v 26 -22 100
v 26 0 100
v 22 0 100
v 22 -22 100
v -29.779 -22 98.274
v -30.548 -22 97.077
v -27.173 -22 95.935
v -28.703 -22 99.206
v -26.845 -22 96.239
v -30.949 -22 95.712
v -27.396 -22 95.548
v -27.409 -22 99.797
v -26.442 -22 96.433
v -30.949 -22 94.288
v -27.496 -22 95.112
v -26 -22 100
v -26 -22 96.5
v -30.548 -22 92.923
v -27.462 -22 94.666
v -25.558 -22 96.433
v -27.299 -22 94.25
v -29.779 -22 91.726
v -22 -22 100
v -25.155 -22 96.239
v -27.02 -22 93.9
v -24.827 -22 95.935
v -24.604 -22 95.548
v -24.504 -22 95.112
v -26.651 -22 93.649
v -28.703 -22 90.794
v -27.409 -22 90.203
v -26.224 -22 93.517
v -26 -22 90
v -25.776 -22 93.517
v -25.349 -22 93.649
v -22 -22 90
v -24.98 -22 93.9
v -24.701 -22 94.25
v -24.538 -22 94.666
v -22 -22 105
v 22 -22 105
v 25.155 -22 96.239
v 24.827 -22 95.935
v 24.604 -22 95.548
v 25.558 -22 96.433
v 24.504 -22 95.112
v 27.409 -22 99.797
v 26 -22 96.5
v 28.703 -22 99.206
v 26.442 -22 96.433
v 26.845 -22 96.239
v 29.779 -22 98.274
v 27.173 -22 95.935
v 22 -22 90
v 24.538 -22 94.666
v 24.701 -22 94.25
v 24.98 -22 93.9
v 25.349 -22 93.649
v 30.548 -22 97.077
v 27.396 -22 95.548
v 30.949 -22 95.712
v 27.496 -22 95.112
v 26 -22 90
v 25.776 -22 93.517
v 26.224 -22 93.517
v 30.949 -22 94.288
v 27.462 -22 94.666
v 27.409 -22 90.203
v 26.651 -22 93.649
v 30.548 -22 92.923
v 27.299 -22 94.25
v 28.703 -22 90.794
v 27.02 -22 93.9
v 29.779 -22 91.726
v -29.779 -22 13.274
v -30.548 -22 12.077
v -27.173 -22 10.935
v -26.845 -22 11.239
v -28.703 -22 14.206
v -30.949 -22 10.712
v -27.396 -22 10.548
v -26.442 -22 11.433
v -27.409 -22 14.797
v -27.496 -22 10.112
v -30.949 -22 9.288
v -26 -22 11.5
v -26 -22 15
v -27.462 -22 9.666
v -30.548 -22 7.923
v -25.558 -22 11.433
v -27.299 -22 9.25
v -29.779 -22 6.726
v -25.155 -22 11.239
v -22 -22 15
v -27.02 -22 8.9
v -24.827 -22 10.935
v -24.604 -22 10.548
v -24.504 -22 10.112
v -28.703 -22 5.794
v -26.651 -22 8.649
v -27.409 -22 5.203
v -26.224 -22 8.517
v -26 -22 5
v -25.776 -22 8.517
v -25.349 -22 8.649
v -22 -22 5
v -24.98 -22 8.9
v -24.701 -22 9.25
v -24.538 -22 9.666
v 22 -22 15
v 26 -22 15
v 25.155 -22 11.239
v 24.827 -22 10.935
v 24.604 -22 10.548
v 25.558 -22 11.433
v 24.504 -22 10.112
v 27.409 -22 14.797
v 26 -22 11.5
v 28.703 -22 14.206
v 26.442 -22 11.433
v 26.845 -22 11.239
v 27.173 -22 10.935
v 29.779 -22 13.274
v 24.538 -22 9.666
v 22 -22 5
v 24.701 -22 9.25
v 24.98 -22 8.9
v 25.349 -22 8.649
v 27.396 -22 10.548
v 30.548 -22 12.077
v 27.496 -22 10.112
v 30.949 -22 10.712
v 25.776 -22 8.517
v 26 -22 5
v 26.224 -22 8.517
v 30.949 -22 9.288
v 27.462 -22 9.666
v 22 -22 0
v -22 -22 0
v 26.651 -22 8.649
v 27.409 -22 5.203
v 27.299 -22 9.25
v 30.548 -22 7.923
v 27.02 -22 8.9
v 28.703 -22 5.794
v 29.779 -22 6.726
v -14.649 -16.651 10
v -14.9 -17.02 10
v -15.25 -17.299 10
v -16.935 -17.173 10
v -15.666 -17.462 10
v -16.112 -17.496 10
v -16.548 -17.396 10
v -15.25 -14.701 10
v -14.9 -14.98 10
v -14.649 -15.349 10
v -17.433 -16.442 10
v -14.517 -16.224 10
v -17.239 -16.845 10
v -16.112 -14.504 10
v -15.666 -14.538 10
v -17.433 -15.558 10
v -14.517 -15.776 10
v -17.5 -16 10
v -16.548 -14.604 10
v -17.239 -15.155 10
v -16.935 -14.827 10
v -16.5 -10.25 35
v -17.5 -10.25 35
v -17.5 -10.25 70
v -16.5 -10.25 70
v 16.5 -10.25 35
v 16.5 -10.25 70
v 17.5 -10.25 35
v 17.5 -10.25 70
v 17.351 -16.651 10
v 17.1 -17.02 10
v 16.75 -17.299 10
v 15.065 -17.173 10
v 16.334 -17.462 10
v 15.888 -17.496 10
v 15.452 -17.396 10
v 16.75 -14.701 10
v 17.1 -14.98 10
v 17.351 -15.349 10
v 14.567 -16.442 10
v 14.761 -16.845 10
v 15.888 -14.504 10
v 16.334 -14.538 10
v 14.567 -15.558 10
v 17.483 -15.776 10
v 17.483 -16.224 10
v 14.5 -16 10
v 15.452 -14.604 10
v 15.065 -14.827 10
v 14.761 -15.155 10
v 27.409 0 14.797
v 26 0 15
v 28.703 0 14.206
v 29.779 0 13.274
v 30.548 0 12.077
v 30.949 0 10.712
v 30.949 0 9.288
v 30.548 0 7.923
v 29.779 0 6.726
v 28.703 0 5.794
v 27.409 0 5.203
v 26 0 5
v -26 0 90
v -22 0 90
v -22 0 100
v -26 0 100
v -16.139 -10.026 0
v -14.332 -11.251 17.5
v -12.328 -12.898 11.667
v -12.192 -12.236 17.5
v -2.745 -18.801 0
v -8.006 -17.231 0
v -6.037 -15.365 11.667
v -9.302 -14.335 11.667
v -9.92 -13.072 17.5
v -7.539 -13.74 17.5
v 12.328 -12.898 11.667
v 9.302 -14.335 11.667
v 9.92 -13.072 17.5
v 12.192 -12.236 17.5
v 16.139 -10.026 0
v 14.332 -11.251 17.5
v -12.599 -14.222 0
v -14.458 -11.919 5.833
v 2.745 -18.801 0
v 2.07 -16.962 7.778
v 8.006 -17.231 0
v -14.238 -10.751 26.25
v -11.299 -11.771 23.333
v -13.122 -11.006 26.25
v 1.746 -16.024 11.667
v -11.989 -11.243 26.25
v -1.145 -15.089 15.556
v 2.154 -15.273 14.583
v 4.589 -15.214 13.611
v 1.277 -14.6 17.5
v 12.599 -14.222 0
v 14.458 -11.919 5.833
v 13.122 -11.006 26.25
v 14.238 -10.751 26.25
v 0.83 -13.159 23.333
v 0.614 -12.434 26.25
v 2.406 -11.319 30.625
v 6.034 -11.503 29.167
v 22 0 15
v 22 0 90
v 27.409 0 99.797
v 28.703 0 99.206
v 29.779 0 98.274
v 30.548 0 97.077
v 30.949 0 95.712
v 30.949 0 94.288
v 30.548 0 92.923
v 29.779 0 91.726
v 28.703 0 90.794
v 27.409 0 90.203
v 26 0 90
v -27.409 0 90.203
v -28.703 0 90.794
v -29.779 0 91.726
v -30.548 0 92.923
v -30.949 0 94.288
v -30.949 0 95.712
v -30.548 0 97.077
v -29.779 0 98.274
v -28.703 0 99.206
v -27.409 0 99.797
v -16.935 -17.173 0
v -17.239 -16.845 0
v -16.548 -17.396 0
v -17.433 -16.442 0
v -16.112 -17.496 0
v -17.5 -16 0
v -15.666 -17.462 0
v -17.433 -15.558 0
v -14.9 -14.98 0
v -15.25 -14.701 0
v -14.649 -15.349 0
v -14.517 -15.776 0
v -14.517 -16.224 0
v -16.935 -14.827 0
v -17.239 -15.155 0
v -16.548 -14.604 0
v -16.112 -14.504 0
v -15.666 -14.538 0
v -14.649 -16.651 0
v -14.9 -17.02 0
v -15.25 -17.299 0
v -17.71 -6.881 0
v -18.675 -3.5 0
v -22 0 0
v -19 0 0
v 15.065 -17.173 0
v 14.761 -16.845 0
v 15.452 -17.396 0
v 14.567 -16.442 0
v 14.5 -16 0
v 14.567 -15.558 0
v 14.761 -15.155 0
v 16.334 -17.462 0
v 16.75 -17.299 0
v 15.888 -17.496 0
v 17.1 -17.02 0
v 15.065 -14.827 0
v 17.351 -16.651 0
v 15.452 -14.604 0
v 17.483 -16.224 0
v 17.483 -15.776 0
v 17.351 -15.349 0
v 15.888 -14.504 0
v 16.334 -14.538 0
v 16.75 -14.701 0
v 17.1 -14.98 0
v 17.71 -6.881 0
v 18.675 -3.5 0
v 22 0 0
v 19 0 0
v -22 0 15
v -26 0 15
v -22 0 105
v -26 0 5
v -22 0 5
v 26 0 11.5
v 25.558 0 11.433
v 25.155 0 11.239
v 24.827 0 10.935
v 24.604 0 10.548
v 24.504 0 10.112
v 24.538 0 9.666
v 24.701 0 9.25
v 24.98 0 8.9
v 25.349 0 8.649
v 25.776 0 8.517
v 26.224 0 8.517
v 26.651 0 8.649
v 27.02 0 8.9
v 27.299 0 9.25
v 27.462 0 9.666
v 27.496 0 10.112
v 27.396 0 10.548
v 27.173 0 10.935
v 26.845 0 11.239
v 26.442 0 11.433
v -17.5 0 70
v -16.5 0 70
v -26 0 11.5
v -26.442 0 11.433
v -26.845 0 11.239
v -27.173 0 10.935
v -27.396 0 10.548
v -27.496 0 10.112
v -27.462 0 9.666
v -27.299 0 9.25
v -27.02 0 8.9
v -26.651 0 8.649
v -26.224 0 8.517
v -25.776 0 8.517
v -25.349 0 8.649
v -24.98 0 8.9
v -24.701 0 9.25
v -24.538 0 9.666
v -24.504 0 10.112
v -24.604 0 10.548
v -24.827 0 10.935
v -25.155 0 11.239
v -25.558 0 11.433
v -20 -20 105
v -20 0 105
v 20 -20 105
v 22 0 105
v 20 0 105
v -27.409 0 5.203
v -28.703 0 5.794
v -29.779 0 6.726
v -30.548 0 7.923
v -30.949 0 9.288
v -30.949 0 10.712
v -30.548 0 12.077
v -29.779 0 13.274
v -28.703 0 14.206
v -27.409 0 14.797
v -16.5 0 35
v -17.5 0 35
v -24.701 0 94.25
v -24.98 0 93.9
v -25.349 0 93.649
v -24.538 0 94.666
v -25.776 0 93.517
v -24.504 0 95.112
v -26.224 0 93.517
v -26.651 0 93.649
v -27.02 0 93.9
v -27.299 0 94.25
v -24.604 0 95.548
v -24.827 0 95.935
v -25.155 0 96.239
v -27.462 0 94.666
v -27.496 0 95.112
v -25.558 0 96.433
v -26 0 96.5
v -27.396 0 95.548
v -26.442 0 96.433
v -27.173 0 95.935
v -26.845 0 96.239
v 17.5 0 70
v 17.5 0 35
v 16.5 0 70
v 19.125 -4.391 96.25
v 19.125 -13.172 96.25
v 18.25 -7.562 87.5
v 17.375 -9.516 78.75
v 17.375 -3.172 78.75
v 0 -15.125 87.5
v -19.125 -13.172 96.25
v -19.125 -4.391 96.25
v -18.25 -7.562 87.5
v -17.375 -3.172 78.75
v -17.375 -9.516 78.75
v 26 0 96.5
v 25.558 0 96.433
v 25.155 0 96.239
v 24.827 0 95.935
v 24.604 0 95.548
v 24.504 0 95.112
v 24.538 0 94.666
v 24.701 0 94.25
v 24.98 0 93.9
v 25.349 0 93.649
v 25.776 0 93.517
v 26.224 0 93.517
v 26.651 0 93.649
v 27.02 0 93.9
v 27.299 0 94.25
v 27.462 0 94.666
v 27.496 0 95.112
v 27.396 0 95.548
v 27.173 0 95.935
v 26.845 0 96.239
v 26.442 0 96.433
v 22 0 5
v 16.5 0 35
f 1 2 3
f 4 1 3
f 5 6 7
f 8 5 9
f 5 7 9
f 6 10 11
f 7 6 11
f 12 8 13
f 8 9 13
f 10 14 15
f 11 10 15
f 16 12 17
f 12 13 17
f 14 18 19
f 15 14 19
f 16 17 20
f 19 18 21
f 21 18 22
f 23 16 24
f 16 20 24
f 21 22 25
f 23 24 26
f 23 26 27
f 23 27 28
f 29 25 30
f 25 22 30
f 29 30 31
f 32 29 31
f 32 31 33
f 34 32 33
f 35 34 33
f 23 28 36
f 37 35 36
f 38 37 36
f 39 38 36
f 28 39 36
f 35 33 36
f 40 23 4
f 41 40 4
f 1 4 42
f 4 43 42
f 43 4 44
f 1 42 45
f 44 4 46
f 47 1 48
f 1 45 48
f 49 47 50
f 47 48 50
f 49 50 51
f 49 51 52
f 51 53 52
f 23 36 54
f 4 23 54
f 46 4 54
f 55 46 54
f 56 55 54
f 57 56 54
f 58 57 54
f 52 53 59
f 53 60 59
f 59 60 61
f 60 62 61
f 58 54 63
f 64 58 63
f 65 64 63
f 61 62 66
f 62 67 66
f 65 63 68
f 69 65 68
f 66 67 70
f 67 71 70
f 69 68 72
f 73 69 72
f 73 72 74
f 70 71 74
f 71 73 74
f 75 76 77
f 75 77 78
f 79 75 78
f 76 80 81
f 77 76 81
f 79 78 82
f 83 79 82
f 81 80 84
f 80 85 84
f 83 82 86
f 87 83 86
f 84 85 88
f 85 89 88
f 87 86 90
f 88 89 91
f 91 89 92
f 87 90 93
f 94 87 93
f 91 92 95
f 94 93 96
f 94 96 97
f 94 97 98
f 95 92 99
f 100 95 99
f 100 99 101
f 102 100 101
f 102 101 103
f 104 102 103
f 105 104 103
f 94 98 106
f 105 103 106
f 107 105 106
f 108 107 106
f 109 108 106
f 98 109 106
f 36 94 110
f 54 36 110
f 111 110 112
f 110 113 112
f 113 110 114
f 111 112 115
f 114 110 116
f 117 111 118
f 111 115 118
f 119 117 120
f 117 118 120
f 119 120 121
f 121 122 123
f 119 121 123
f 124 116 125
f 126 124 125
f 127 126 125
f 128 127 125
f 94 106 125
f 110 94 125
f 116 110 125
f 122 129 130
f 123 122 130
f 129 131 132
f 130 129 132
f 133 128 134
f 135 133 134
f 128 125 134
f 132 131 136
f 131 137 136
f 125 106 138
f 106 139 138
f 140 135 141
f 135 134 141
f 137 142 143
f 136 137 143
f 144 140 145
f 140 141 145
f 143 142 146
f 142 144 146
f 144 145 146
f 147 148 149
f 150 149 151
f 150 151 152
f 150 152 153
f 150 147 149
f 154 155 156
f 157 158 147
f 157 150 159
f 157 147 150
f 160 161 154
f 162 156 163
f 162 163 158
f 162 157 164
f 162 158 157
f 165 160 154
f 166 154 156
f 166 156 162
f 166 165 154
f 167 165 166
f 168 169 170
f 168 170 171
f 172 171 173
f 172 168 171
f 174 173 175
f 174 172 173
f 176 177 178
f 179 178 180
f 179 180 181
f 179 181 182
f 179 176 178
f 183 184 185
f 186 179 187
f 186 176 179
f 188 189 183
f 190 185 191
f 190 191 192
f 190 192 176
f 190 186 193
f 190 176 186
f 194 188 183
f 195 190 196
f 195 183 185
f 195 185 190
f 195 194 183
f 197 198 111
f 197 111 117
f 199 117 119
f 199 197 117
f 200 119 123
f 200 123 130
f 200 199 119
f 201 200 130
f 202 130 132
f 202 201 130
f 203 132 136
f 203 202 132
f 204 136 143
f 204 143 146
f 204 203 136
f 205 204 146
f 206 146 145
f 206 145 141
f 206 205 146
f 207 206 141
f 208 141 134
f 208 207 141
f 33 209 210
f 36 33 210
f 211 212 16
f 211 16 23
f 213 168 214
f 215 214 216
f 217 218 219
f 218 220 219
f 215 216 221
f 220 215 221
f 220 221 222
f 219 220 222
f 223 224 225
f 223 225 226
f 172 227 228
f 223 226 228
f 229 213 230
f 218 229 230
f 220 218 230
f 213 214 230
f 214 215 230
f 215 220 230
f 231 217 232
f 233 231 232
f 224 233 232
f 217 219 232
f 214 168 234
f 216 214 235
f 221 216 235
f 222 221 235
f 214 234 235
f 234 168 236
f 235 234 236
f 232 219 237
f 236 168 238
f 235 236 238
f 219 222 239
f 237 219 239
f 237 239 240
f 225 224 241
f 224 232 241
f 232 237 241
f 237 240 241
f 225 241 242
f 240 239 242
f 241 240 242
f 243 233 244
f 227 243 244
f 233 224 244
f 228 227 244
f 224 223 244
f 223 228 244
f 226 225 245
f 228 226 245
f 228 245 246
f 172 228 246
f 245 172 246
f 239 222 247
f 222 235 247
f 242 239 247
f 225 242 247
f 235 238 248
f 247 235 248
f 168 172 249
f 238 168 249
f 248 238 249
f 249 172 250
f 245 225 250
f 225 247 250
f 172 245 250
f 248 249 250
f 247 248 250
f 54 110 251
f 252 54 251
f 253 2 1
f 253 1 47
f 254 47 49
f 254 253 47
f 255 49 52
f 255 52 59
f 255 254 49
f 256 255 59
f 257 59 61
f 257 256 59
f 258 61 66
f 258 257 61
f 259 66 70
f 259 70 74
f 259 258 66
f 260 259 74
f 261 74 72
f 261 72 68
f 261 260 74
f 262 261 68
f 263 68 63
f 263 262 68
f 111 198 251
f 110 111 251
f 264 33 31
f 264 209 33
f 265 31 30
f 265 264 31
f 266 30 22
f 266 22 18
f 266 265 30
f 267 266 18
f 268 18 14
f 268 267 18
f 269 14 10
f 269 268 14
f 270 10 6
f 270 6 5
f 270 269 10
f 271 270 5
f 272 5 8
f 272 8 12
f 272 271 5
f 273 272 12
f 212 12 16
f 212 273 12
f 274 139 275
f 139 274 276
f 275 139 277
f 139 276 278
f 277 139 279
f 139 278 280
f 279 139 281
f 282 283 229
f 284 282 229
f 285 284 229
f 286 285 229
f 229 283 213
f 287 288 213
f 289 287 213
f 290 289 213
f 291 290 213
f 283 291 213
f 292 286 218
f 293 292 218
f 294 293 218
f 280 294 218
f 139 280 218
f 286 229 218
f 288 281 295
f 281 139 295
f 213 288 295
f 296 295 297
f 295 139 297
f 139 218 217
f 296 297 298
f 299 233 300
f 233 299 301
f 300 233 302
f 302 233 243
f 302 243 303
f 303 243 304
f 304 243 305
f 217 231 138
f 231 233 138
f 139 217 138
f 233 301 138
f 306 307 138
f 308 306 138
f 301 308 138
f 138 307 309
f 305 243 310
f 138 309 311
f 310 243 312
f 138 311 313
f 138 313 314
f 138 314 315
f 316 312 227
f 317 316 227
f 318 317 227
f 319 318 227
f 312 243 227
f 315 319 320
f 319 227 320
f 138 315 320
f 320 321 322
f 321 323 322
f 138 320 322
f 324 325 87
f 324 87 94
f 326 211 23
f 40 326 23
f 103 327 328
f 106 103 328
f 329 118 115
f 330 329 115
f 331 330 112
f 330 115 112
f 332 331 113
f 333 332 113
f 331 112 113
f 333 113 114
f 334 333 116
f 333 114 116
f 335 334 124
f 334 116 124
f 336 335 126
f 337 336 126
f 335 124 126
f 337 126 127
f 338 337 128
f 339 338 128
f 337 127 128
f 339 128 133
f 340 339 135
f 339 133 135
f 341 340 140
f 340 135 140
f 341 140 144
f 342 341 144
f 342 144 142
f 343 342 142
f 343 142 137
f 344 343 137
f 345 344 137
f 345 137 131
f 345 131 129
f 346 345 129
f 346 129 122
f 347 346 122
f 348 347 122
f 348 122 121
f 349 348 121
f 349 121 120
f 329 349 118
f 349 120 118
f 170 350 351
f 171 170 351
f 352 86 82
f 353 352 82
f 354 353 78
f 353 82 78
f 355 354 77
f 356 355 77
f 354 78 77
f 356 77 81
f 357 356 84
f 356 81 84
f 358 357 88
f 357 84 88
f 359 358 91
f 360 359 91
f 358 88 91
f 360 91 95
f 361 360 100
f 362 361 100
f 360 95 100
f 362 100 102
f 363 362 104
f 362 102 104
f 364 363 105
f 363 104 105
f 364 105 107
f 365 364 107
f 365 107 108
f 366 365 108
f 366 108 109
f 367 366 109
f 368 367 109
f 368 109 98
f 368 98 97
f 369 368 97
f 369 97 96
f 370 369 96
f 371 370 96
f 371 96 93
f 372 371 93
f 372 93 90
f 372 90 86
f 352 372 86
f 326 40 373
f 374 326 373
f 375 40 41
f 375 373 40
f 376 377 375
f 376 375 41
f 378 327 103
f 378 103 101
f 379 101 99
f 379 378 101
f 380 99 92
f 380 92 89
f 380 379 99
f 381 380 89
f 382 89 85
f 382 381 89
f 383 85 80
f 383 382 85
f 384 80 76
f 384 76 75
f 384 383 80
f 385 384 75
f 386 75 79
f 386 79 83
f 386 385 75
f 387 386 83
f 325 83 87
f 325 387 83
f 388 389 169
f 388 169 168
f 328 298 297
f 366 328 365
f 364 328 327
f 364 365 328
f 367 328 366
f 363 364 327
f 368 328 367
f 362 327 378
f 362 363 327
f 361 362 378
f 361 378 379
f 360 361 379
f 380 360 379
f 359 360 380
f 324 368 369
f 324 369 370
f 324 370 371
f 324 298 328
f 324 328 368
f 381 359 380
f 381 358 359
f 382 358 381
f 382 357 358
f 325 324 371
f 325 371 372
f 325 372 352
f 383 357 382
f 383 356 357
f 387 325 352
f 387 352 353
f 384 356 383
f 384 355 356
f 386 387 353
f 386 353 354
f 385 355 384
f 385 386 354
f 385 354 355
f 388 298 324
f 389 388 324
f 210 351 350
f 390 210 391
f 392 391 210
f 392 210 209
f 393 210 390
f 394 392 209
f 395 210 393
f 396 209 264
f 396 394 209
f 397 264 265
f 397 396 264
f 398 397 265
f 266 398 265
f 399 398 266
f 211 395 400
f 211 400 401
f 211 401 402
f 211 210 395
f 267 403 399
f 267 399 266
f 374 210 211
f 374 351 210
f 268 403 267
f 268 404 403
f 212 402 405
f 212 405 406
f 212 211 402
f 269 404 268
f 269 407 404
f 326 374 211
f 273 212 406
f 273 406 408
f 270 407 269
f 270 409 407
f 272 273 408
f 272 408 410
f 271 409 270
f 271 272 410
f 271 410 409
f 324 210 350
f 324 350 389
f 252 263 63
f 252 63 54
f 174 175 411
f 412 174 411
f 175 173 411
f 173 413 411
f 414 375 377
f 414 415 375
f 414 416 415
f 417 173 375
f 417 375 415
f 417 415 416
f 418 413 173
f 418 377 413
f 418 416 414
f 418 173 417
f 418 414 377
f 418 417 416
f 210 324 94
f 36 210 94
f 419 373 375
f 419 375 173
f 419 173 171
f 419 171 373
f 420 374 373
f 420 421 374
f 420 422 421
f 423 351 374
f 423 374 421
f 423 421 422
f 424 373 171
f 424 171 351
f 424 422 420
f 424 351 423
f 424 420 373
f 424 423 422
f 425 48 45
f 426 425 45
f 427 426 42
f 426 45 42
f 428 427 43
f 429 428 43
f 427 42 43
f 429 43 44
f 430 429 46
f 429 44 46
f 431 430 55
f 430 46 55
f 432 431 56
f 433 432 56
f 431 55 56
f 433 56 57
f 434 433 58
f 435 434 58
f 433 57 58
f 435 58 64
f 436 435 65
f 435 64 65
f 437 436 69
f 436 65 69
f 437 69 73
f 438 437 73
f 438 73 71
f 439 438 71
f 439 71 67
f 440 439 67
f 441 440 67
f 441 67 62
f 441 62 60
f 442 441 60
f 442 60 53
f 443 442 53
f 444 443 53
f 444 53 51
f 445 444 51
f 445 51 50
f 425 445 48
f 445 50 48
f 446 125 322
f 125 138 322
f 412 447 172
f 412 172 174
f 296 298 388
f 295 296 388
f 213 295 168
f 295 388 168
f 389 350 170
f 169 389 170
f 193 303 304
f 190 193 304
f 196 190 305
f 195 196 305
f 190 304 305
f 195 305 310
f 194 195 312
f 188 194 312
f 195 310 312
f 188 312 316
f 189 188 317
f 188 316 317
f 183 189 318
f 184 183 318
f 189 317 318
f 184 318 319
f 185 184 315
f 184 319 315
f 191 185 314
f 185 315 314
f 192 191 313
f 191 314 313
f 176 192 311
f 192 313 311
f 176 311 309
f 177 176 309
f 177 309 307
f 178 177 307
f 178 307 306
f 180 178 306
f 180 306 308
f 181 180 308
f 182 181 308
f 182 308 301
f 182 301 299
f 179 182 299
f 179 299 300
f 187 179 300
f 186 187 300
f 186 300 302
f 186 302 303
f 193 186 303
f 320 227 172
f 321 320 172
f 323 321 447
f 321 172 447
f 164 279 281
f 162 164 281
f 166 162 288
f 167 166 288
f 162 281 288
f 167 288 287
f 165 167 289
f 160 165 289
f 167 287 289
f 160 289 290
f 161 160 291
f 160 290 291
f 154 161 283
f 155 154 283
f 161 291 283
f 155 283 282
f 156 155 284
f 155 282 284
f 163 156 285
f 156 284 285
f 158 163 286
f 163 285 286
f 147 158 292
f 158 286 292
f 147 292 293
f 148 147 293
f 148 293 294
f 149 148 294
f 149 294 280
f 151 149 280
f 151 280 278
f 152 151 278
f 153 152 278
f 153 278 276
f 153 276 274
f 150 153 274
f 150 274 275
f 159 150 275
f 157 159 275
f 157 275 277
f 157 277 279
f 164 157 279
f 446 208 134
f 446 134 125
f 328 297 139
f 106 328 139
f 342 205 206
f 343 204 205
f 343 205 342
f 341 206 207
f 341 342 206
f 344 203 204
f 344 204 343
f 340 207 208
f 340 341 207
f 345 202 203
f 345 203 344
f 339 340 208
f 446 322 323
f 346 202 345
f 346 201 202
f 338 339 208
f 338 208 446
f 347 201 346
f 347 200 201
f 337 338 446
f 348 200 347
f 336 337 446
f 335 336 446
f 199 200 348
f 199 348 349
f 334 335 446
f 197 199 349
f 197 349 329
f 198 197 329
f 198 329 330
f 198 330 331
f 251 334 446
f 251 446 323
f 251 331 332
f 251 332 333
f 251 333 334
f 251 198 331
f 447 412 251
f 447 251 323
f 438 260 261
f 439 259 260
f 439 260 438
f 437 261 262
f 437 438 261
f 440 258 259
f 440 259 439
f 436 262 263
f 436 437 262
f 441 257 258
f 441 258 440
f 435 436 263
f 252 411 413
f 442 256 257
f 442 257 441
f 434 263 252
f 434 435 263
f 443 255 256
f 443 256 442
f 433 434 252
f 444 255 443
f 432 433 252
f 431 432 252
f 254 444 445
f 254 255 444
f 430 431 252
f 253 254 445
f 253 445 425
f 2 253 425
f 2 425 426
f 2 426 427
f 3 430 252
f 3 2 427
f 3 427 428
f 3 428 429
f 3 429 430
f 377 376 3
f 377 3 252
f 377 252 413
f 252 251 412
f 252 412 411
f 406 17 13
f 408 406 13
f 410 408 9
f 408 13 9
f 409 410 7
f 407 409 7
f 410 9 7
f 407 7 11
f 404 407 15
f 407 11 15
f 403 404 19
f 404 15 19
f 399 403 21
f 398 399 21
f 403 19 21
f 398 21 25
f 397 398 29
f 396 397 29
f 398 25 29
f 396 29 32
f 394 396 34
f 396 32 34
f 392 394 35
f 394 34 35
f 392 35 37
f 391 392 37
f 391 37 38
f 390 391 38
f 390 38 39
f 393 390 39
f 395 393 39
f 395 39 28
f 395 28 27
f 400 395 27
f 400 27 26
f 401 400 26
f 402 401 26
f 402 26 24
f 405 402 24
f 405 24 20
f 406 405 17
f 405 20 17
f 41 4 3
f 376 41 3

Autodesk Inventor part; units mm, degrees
ref_plane "YZ Plane" through (0, 0, 0) normal (1, 0, 0) x (0, 1, 0)
ref_plane "XZ Plane" through (0, 0, 0) normal (0, 1, 0) x (-1, 0, 0)
ref_plane "Płaszczyzna konstrukcyjna3" through (0, 0, 35) normal (0, 0, 1) x (1, 0, 0)
ref_plane "Płaszczyzna konstrukcyjna4" through (0, 0, 70) normal (0, 0, 1) x (1, 0, 0)
ref_plane "Płaszczyzna konstrukcyjna5" through (0, 0, 105) normal (0, 0, 1) x (1, 0, 0)
sketch "Szkic7" plane through (0, 0, 0) normal (0, 0, 1) x (1, 0, 0)
  circle A0 centre (0, 0) radius 19
  dimension "d41" = 38
sketch "Szkic9" plane through (0, 0, 35) normal (0, 0, 1) x (1, 0, 0)
  line L0 (16.5, 10.25) -> (-16.5, 10.25)
  line L1 (-16.5, 10.25) -> (-16.5, -10.25)
  line L2 (-16.5, -10.25) -> (16.5, -10.25)
  line L3 (16.5, -10.25) -> (16.5, 10.25)
  line L4 (16.5, 10.25) -> (-16.5, -10.25) construction
  line L5 (-16.5, 10.25) -> (16.5, -10.25) construction
  point P0 (0, 0)
  dimension "d42" = 33
  dimension "d43" = 20.5
sketch "Szkic10" plane through (0, 0, 70) normal (0, 0, 1) x (1, 0, 0)
  line L0 (16.5, 10.25) -> (-16.5, 10.25) projected
  line L1 (-16.5, 10.25) -> (-16.5, -10.25) projected
  line L2 (-16.5, -10.25) -> (16.5, -10.25) projected
  line L3 (16.5, -10.25) -> (16.5, 10.25) projected
  point P0 (0, 0)
sketch "Szkic11" plane through (0, 0, 105) normal (0, 0, 1) x (1, 0, 0)
  line L0 (20, -20) -> (-20, -20)
  line L1 (-20, -20) -> (-20, 20)
  line L2 (-20, 20) -> (20, 20)
  line L3 (20, 20) -> (20, -20)
  line L4 (20, -20) -> (-20, 20) construction
  line L5 (-20, -20) -> (20, 20) construction
  point P0 (0, 0)
  dimension "d44" = 40
  dimension "d45" = 40
sketch "Szkic12" plane through (0, 0, 0) normal (0, 0, 1) x (1, 0, 0)
  line L0 (-22, -22) -> (22, -22)
  line L1 (22, -22) -> (22, 22)
  line L2 (22, 22) -> (-22, 22)
  line L3 (-22, 22) -> (-22, -22)
  line L4 (-22, -22) -> (22, 22) construction
  line L5 (22, -22) -> (-22, 22) construction
  point P0 (0, 0)
  dimension "d46" = 44
  dimension "d47" = 44
extrude "Wyciągnięcie proste1" add sketch "Szkic12" along normal blind 105
extrude "Wyciągnięcie proste2" cut sketch "Szkic9" along normal blind 35
loft "Wyciągnięcie złożone1" cut profiles "Szkic7" section 2 edges at (-16.5, 0, 35) (0, -10.25, 35) (16.5, 0, 35) (0, 10.25, 35)
loft "Wyciągnięcie złożone2" cut profiles "Szkic11" section 2 edges at (-16.5, 0, 70) (0, 10.25, 70) (16.5, 0, 70) (0, -10.25, 70)
sketch "Szkic13" plane through (0, 0, 70) normal (0, 0, 1) x (1, 0, 0)
  line L0 (-17.5, -10.25) -> (17.5, -10.25)
  line L1 (17.5, -10.25) -> (17.5, 10.25)
  line L2 (17.5, 10.25) -> (-17.5, 10.25)
  line L3 (-17.5, 10.25) -> (-17.5, -10.25)
  line L4 (-17.5, -10.25) -> (17.5, 10.25) construction
  line L5 (17.5, -10.25) -> (-17.5, 10.25) construction
  point P0 (0, 0)
  dimension "d60" = 35
  dimension "d61" = 20.5
extrude "Wyciągnięcie proste3" cut sketch "Szkic13" against normal blind 35
sketch "Szkic14" plane through (-22, 22, 0) normal (0, 1, 0) x (1, 0, 0)
  point P0 (22, 0)
sketch "Szkic15" plane through (-16.2734, 10.25, 35) normal (0, -1, 0) x (1, 0, 0)
  line L0 (32.5467, 0) -> (0, 0) construction
  line L1 (16.2734, 0) -> (16.2734, -12) construction
  circle A0 centre (16.2734, -12) radius 4
  point P0 (16.2734, -35)
  dimension "d64" = 12
  dimension "d65" = 8
extrude "Wyciągnięcie proste4" cut sketch "Szkic15" against normal through all
sketch "Szkic16" plane through (0, 0, 0) normal (0, 0, -1) x (-1, 0, 0)
  line L0 (-16, -16) -> (16, -16) construction
  line L1 (16, -16) -> (16, 16) construction
  line L2 (16, 16) -> (-16, 16) construction
  line L3 (-16, 16) -> (-16, -16) construction
  line L4 (-16, -16) -> (16, 16) construction
  line L5 (16, -16) -> (-16, 16) construction
  circle A0 centre (-16, 16) radius 1.5
  circle A1 centre (-16, -16) radius 1.5
  circle A2 centre (16, -16) radius 1.5
  circle A3 centre (16, 16) radius 1.5
  point P0 (0, 0)
  dimension "d68" = 32
  dimension "d69" = 32
  dimension "d70" = 3
extrude "Wyciągnięcie proste5" cut sketch "Szkic16" against normal blind 10
sketch "Szkic17" plane through (0, 0, 0) normal (0, 1, 0) x (-1, 0, 0)
  line L0 (-35.497, 120.9522) -> (40.1676, 120.9522)
  line L1 (40.1676, 120.9522) -> (40.1676, -13.5628)
  line L2 (40.1676, -13.5628) -> (-35.497, -13.5628)
  line L3 (-35.497, -13.5628) -> (-35.497, 120.9522)
  point P0 (0, 0)
sketch "Szkic18" plane through (-22, 22, 0) normal (0, 1, 0) x (1, 0, 0)
  point P0 (22, 0)
sketch "Szkic19" plane through (-22, 22, 0) normal (0, 1, 0) x (1, 0, 0)
  line L0 (44, 0) -> (44, -105) projected
  line L1 (44, -105) -> (44, -95) construction
  line L2 (44, -95) -> (48, -95) construction
  arc A0 (48, -100) -> (48, -90) centre (48, -95) ccw
  line L3 (48, -100) -> (44, -100)
  line L4 (48, -90) -> (44, -90)
  line L5 (44, -100) -> (44, -90)
  line L6 (22, -110.411) -> (22, 7.1772) construction
  line L7 (-9.1147, -52.5) -> (56.3126, -52.5) construction
  line L8 (44, -10) -> (48, -10) construction
  arc A1 (48, -15) -> (48, -5) centre (48, -10) ccw
  line L9 (48, -5) -> (44, -5)
  line L10 (48, -15) -> (44, -15)
  line L11 (44, -5) -> (44, -15)
  line L12 (0, 0) -> (0, -105)
  line L13 (0, -105) -> (0, -95) construction
  line L14 (0, -95) -> (-4, -95) construction
  arc A2 (-4, -90) -> (-4, -100) centre (-4, -95) ccw
  line L15 (-4, -100) -> (0, -100)
  line L16 (-4, -90) -> (0, -90)
  line L17 (0, -100) -> (0, -90)
  line L18 (0, -10) -> (-4, -10) construction
  arc A3 (-4, -5) -> (-4, -15) centre (-4, -10) ccw
  line L19 (-4, -5) -> (0, -5)
  line L20 (-4, -15) -> (0, -15)
  line L21 (0, -5) -> (0, -15)
  point P0 (22, 0)
  dimension "d73" = 10
  dimension "d74" = 4
  dimension "d75" = 10
extrude "Wyciągnięcie proste6" add sketch "Szkic19" against normal up to surface (44 mm away)
sketch "Szkic20" plane through (-22, 22, 0) normal (0, 1, 0) x (1, 0, 0)
  arc A0 (48, -15) -> (48, -5) centre (48, -10) ccw projected
  arc A1 (-4, -5) -> (-4, -15) centre (-4, -10) ccw projected
  arc A2 (-4, -90) -> (-4, -100) centre (-4, -95) ccw projected
  arc A3 (48, -100) -> (48, -90) centre (48, -95) ccw projected
  point P0 (22, 0)
hole "Otwór1" at (26, 22, 10) at (-26, 22, 10) at (26, 22, 95) at (-26, 22, 95) direction (0, -1, 0) diameter 3 end through all counterbore diameter 5 counterbore depth 2
extrude "Wyciągnięcie proste7" cut sketch "Szkic17" along normal up to surface (22 mm away)
properties part number "heater_case_bottom"
